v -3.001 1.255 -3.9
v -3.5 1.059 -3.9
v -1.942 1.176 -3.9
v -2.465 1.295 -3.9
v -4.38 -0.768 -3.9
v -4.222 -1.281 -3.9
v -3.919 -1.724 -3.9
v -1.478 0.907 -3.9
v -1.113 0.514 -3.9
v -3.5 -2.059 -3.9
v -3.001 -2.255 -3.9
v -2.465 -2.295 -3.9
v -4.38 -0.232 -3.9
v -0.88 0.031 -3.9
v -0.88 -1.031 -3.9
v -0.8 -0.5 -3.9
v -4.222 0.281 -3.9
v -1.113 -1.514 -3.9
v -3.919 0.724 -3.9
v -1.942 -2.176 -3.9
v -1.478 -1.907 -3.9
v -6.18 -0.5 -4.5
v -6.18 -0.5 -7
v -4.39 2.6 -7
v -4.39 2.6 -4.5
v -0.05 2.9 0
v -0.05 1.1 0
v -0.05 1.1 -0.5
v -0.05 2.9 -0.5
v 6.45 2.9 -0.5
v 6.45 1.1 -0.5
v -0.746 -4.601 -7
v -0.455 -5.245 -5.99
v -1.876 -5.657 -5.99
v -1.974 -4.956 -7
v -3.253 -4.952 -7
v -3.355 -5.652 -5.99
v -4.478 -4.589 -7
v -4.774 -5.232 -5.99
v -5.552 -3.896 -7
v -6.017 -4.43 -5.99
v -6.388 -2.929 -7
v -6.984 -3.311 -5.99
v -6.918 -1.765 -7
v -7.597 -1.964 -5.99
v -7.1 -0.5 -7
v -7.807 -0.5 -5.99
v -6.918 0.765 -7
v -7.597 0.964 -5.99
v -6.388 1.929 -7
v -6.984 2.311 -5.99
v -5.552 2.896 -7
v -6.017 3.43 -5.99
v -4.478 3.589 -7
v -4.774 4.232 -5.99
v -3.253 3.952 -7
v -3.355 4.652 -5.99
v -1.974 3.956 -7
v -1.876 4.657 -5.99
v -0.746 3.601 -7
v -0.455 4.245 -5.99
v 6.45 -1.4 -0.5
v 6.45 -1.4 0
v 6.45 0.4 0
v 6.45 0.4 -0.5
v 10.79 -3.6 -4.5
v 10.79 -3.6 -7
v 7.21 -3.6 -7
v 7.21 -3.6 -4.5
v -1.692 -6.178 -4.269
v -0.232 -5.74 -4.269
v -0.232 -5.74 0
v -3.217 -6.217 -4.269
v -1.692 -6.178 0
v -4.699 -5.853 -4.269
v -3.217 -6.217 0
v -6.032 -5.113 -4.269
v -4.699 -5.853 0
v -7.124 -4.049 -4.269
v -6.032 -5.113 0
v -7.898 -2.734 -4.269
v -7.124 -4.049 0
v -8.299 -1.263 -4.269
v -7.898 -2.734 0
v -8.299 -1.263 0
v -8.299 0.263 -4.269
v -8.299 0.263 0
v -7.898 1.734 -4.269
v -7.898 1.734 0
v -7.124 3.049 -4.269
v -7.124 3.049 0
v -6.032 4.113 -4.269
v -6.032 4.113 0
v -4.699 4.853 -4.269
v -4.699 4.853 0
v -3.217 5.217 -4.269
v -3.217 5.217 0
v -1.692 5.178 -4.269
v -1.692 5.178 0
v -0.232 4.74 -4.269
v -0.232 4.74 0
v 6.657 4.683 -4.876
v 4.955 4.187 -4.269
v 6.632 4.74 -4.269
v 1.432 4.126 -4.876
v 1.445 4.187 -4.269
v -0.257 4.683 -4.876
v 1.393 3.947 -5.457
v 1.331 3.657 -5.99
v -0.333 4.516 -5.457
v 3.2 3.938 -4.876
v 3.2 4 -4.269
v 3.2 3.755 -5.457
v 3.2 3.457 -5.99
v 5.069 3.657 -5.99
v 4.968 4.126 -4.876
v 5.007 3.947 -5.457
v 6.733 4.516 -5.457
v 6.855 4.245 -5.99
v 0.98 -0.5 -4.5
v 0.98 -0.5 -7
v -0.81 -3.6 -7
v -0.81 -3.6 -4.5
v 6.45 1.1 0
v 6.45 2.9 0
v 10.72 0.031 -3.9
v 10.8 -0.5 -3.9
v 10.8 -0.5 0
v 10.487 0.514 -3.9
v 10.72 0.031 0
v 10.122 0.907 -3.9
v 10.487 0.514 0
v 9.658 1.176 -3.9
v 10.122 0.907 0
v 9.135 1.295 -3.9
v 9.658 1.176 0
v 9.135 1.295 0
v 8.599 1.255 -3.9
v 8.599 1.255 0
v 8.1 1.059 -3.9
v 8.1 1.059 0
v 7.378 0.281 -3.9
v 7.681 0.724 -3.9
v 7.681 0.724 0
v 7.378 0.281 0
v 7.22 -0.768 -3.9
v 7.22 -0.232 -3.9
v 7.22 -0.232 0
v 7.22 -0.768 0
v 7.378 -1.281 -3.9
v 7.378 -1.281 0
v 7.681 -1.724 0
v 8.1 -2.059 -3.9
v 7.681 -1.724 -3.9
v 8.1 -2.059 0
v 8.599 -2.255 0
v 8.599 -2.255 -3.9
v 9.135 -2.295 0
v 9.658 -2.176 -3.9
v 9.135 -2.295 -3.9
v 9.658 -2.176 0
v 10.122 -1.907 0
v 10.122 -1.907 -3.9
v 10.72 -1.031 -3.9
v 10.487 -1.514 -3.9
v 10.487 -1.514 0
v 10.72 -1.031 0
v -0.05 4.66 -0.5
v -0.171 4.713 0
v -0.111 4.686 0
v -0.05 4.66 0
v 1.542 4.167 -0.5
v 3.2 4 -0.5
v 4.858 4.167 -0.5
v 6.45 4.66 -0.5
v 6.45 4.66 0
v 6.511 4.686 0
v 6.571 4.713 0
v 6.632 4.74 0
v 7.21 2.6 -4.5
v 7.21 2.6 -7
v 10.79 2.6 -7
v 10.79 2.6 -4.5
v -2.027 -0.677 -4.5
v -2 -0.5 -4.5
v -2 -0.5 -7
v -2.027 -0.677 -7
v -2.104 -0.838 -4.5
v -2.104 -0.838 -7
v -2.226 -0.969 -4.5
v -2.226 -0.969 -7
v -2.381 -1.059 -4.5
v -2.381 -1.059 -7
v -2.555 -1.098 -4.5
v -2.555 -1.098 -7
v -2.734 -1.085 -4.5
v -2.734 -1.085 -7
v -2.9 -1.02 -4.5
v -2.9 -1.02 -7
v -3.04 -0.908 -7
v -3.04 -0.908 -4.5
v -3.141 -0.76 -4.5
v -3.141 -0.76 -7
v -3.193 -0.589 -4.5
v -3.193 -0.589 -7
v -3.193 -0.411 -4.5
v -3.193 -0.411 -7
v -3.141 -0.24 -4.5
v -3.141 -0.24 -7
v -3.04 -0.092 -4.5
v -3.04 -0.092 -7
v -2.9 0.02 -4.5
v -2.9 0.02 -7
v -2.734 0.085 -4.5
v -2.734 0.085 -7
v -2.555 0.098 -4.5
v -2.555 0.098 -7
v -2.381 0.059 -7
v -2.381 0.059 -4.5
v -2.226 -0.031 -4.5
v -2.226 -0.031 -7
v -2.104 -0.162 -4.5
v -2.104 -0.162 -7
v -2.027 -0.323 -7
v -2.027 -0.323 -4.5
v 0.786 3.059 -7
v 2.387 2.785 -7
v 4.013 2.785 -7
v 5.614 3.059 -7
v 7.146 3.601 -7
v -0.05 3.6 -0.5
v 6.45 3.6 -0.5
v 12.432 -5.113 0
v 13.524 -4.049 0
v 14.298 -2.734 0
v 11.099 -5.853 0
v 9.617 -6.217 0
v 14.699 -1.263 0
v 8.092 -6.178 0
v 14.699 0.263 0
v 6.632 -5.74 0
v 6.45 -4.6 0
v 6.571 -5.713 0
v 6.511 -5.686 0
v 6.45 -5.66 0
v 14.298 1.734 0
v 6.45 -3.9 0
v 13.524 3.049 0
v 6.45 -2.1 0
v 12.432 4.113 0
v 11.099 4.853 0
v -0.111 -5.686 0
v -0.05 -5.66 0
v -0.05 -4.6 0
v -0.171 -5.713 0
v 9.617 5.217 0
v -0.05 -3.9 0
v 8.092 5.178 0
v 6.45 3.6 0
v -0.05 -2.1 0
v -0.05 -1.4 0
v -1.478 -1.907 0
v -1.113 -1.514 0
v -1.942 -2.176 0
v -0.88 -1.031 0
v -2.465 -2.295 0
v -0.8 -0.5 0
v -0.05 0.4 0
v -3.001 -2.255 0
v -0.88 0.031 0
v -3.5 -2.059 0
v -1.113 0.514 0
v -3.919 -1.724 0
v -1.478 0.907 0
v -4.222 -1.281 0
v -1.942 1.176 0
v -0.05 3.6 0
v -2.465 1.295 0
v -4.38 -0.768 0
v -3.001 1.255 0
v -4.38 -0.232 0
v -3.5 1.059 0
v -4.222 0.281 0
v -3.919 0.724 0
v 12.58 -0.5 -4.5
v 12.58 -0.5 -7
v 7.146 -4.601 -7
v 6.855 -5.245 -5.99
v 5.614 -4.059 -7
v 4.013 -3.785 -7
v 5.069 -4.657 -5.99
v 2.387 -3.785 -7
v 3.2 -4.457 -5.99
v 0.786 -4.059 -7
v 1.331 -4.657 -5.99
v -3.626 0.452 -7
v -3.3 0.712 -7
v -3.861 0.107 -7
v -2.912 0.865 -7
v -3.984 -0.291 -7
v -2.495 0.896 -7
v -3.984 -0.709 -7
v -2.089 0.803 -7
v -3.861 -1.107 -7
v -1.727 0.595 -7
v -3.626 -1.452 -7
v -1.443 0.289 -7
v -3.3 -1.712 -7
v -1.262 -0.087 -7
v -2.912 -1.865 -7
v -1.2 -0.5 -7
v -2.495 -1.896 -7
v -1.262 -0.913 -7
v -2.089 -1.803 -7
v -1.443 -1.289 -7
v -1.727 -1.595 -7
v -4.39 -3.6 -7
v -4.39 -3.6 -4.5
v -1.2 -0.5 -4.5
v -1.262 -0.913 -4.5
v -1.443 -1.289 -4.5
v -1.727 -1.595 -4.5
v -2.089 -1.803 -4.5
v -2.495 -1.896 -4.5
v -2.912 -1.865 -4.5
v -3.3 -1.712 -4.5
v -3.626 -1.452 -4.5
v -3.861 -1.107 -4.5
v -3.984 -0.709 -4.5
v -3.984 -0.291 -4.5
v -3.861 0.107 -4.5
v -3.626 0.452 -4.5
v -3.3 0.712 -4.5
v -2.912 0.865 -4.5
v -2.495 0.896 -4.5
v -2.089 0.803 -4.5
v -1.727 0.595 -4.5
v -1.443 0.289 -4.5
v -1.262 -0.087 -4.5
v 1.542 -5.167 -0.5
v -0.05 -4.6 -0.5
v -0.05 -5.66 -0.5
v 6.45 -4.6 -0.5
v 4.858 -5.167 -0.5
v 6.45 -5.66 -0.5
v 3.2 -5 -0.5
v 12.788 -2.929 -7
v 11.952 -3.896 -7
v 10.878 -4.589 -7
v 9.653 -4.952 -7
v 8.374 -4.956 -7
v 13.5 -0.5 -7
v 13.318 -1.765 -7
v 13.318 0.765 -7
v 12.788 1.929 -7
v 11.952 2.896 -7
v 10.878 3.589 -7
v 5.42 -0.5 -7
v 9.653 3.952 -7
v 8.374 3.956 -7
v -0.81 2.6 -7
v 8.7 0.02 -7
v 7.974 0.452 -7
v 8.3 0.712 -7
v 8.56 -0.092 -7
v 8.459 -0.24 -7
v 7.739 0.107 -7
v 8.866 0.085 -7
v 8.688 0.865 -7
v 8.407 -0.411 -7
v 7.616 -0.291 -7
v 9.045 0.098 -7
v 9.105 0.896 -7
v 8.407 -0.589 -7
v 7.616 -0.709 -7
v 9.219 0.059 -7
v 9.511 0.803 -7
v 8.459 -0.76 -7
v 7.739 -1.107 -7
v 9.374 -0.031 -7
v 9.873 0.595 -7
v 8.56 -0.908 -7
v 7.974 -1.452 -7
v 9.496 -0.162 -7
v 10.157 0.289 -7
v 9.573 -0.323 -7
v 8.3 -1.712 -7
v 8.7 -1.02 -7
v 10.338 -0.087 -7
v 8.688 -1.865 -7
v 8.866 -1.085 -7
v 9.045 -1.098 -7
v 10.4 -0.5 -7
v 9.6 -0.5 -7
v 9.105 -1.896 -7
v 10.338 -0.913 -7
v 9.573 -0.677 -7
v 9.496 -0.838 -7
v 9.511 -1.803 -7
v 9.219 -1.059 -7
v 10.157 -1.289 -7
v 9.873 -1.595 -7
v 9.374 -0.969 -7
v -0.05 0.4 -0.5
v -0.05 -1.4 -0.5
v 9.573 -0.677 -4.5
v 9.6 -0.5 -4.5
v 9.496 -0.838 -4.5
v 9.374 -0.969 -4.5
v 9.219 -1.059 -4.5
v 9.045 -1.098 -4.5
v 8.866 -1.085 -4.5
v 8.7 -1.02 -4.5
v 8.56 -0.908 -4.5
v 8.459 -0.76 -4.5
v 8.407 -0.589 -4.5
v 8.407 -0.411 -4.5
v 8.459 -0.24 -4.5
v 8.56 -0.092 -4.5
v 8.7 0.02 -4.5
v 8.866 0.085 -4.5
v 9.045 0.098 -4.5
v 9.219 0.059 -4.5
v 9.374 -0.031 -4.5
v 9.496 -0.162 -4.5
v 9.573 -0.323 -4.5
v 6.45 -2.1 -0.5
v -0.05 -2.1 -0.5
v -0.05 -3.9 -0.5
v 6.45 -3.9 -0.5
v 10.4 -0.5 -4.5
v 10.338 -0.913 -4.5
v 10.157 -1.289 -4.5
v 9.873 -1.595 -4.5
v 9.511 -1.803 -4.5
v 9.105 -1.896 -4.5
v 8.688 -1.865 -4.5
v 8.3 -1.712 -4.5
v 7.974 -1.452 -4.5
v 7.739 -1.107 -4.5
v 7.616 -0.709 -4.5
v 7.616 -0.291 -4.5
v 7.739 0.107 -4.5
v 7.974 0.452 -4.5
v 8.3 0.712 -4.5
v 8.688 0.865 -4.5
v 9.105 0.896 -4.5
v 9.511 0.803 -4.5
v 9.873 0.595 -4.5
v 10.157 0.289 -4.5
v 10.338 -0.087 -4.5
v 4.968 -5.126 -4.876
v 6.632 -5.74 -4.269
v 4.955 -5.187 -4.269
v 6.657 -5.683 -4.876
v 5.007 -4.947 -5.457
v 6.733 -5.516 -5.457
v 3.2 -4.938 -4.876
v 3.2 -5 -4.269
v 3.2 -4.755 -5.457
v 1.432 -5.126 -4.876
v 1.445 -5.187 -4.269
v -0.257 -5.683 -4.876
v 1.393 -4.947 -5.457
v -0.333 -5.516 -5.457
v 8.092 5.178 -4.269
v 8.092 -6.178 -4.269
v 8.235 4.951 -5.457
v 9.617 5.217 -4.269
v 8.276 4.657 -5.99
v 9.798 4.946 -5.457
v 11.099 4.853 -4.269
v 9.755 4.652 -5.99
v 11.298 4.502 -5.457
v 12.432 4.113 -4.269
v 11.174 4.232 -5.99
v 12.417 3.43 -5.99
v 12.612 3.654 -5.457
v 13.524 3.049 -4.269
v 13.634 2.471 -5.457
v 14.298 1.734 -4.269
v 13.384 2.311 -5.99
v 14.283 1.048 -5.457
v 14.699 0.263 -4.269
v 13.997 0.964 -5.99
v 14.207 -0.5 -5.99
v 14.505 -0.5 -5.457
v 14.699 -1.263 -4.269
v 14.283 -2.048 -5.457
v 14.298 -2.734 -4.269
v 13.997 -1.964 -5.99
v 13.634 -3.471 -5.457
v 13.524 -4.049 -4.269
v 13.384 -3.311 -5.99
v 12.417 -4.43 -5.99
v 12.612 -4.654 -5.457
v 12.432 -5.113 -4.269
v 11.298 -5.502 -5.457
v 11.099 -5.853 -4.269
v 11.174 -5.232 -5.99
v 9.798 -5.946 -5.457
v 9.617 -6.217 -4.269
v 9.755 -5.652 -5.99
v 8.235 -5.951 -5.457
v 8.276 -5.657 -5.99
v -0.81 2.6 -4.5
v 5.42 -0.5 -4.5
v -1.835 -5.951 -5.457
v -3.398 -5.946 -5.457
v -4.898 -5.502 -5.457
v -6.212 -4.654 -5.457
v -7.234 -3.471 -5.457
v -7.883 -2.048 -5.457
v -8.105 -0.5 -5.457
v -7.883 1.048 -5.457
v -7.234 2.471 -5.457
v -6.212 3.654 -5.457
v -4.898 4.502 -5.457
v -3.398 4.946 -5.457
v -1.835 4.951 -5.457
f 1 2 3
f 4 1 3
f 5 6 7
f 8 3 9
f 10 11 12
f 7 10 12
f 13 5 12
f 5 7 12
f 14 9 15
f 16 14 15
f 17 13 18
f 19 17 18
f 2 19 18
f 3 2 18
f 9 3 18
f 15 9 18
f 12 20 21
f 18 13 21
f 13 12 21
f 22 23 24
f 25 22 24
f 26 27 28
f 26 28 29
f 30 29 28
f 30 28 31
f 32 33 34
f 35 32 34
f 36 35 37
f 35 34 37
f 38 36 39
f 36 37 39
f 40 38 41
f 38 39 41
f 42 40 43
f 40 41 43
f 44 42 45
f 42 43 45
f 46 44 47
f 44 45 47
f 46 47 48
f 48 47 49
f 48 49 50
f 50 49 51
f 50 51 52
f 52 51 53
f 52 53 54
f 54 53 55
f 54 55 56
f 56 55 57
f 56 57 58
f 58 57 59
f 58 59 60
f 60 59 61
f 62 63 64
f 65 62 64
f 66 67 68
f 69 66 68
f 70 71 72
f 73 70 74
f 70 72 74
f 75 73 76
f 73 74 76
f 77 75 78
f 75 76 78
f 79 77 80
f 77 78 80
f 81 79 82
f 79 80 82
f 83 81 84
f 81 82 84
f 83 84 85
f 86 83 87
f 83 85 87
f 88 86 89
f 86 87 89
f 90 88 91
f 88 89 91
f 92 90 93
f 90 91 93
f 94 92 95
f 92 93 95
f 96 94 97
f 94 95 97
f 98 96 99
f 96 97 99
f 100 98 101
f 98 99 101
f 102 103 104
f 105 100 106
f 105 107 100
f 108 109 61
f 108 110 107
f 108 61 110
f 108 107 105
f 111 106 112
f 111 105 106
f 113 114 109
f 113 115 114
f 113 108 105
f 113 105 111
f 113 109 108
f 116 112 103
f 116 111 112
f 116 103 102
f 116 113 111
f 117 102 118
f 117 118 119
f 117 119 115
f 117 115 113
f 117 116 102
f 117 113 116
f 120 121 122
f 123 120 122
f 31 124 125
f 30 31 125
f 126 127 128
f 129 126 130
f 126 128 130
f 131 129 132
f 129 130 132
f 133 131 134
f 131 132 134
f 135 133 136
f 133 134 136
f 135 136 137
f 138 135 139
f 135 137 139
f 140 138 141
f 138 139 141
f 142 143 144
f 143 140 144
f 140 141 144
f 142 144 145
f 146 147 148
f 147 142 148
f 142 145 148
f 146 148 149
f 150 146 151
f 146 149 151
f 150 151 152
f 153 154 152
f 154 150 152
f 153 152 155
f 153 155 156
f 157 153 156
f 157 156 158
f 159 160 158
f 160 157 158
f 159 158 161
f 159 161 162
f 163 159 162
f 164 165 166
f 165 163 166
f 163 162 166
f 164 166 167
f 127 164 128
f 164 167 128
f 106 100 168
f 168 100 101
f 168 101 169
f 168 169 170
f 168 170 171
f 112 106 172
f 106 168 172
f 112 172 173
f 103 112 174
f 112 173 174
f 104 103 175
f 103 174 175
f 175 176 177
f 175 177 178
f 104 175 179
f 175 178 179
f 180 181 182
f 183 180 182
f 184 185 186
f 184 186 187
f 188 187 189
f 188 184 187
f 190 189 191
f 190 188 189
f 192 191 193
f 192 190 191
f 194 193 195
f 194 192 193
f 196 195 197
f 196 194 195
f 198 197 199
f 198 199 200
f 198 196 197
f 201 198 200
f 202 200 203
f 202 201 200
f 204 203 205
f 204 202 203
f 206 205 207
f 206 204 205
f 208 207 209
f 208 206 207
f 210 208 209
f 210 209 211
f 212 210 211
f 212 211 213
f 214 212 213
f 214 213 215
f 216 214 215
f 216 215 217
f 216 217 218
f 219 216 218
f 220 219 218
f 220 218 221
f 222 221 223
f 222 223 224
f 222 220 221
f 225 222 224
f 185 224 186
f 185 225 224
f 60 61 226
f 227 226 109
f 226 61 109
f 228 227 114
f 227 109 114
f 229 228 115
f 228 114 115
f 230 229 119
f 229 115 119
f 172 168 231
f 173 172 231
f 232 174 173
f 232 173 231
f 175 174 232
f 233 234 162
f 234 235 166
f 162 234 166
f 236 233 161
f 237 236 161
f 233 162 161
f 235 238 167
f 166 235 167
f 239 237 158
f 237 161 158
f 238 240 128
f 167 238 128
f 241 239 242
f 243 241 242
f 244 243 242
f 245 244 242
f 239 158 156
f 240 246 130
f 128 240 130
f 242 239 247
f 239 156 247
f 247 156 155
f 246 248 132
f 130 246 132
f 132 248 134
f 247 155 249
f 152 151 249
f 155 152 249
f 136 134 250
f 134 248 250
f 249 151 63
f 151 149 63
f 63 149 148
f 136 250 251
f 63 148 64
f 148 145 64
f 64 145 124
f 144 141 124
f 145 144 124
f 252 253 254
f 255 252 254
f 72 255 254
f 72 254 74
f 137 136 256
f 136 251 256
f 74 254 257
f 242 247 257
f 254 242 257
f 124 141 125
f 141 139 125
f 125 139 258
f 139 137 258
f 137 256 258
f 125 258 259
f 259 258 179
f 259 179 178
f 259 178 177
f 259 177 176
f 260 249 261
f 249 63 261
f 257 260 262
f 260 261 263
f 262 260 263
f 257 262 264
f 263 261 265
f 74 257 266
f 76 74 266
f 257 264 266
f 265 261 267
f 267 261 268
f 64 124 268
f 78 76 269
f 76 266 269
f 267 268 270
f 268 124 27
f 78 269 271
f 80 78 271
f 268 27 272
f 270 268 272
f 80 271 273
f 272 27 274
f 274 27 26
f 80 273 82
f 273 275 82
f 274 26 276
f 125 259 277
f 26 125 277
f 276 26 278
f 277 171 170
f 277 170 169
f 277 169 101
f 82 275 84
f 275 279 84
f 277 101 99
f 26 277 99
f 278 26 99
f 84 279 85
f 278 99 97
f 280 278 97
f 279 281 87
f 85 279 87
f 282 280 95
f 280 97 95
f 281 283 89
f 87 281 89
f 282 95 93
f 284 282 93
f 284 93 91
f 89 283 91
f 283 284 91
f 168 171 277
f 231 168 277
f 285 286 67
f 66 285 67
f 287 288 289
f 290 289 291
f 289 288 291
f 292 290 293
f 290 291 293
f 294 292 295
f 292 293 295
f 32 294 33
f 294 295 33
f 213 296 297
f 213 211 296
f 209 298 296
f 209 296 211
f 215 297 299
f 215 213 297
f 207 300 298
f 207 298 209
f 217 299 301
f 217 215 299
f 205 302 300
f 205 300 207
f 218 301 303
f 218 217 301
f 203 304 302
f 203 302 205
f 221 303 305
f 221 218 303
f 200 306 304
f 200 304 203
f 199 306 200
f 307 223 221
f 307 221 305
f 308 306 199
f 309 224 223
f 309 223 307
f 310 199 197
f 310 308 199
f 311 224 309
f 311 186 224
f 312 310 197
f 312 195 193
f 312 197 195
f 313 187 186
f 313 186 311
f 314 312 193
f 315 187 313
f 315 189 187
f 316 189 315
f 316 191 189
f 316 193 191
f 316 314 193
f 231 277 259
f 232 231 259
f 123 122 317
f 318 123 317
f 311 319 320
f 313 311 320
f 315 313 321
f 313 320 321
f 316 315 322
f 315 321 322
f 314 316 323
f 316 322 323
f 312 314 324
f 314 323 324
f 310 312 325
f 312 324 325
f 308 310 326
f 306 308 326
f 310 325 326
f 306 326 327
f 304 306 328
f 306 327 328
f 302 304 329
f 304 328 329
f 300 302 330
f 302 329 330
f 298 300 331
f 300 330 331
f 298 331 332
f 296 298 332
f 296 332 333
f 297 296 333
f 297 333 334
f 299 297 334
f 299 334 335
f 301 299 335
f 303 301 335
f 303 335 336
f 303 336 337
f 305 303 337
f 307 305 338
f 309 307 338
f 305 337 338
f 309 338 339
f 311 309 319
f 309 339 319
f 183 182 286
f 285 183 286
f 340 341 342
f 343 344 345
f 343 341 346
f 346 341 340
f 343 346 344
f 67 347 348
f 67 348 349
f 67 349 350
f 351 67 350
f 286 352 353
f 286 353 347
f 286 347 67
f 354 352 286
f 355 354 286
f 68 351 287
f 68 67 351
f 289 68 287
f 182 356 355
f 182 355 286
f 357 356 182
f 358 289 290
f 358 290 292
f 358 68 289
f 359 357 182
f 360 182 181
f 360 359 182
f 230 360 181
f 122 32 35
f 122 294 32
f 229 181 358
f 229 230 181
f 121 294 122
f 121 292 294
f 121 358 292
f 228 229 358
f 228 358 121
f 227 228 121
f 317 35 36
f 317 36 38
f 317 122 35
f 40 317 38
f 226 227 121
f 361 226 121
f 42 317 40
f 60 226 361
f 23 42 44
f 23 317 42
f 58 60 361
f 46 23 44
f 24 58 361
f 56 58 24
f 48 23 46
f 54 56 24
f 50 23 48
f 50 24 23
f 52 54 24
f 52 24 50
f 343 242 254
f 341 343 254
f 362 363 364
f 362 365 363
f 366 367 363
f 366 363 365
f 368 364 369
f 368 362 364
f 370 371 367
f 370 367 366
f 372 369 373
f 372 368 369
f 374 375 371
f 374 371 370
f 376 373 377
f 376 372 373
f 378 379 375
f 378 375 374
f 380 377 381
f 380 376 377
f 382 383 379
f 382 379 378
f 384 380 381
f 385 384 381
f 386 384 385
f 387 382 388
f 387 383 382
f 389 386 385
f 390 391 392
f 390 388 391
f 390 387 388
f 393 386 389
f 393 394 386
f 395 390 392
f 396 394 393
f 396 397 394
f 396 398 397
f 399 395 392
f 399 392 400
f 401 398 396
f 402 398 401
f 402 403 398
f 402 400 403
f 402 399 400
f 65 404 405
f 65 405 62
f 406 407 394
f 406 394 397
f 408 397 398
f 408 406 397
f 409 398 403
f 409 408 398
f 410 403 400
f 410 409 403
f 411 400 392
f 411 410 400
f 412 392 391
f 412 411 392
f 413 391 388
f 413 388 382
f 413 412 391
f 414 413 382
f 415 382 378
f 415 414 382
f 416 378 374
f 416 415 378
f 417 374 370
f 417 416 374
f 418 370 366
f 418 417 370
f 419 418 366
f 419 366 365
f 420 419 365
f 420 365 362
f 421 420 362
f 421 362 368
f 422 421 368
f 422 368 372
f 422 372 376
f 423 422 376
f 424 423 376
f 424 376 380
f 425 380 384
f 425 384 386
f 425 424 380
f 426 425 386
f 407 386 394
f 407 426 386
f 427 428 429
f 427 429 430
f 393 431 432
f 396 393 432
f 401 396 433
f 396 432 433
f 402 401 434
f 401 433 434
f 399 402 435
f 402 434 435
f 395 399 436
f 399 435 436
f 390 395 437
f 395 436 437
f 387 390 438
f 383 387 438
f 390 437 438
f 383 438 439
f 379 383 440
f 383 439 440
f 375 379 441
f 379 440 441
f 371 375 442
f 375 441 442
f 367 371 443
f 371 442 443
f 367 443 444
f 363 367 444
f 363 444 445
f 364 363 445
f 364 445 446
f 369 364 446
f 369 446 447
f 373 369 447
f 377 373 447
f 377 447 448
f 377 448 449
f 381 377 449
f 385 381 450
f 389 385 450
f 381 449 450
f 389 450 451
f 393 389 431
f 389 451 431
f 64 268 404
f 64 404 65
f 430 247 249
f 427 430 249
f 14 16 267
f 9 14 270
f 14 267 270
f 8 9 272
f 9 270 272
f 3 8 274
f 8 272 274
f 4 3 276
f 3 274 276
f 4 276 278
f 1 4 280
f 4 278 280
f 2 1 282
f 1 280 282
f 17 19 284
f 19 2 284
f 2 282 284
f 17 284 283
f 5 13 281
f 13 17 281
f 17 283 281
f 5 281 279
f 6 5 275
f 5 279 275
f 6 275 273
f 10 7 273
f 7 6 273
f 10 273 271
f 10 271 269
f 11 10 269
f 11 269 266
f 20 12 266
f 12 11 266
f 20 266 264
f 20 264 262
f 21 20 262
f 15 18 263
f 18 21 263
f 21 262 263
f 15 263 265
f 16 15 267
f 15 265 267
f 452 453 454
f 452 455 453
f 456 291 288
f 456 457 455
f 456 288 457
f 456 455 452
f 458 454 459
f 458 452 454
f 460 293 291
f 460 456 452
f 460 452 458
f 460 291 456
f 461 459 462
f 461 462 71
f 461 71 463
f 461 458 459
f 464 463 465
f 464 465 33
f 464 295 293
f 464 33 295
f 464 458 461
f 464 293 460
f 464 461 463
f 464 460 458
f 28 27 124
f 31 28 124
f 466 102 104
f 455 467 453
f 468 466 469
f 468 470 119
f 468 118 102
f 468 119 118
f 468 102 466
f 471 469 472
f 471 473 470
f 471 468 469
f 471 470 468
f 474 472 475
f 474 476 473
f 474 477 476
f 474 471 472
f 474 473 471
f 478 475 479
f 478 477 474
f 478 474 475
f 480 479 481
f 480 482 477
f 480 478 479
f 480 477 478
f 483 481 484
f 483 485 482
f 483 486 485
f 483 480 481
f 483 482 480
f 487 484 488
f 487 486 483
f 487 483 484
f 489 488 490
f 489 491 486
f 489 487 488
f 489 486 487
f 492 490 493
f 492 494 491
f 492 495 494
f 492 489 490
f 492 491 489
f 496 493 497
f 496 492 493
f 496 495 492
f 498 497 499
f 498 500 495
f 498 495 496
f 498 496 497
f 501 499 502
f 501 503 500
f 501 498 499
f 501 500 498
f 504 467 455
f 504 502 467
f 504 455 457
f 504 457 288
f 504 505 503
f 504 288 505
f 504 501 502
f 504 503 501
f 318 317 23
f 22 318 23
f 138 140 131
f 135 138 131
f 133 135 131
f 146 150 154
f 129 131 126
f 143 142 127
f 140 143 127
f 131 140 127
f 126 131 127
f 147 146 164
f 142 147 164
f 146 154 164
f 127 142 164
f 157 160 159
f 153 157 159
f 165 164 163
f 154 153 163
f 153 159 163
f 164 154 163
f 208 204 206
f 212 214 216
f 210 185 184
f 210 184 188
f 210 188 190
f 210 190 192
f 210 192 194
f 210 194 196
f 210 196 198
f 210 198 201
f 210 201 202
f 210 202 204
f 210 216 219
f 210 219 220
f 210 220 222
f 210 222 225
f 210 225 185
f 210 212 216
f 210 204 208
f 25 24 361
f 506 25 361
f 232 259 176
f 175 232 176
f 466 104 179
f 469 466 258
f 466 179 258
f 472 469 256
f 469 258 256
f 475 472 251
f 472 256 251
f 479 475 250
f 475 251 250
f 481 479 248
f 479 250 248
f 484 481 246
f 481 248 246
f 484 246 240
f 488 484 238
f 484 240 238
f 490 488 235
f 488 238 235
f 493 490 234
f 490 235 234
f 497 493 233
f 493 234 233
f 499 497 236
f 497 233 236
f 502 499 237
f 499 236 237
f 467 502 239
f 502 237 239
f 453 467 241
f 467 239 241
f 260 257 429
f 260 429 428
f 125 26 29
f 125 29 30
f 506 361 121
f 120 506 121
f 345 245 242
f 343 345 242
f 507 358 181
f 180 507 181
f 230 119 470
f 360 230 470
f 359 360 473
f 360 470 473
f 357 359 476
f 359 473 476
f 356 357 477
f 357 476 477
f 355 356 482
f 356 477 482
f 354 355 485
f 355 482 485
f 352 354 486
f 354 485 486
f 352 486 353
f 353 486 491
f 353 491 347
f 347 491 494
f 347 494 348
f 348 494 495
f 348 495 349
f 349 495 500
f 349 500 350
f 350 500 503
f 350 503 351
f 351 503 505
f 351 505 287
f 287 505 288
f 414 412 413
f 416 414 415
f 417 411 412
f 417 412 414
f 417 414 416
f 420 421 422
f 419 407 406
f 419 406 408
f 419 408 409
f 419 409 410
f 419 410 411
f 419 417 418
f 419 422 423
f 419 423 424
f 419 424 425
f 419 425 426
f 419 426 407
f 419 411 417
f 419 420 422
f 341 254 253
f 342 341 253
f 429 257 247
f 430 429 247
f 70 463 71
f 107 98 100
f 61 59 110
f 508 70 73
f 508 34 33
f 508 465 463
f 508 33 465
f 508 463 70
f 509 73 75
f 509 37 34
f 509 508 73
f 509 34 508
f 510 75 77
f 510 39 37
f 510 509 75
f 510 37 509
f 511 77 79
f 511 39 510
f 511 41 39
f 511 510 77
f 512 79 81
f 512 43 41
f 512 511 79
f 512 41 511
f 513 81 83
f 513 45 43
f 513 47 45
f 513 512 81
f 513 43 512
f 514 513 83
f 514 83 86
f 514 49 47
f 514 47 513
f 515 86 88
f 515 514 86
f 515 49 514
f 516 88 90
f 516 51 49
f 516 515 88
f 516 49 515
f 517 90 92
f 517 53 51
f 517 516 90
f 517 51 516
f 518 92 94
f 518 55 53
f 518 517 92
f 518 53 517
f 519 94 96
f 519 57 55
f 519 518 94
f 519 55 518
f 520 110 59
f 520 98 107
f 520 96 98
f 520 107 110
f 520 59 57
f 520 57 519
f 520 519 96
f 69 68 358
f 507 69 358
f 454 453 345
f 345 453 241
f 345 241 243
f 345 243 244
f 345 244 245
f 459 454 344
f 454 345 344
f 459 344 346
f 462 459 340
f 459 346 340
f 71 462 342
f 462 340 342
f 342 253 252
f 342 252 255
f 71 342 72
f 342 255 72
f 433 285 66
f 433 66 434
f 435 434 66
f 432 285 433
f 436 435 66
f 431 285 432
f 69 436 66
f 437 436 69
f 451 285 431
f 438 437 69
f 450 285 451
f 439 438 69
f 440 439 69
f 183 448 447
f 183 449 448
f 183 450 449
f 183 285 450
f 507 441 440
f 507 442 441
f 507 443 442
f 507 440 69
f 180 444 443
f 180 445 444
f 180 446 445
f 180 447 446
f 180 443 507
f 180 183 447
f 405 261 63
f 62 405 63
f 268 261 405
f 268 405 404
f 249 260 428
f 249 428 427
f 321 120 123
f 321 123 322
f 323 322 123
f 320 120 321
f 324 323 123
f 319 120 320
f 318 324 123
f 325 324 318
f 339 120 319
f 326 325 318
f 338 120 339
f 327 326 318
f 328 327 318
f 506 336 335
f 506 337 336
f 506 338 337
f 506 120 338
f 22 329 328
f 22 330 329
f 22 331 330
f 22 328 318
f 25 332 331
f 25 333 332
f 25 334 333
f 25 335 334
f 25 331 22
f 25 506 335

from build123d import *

# Parameters (mm, degrees)
BOSS_EXTRUDE1_DEPTH = 7
SKETCH5_R           = 1.799999865
SKETCH5_R_2         = 1.8
CUT_EXTRUDE4_DEPTH  = 18.482133737
SKETCH2_W           = 6.5
SKETCH2_H           = 1.8
CUT_EXTRUDE1_DEPTH  = 0.5
CUT_EXTRUDE5_DEPTH  = 2.5
CHAMFER1_SIZE       = 1.25
CHAMFER1_SIZE2      = 1.785185008
FILLET1_R           = 3
BOSS_EXTRUDE2_START = -0.6
SKETCH7_R           = 1.799999865
SKETCH7_R_2         = 1.8
BOSS_EXTRUDE2_DEPTH = 0.6
SKETCH8_R           = 1.399999865
SKETCH8_R_2         = 0.599999865
SKETCH8_R_3         = 1.4
SKETCH8_R_4         = 0.6
BOSS_EXTRUDE3_DEPTH = 2.5


with BuildPart() as part:
    # Sketch1 → Boss-Extrude1 (new body)
    with BuildSketch(Plane.XY):
        with BuildLine():
            ThreePointArc((6.631560259, -5.739560401), (3.2, -5), (-0.231560259, -5.739560401))
            ThreePointArc((-0.231560259, -5.739560401), (-8.35, -0.5), (-0.231560259, 4.739560401))
            ThreePointArc((-0.231560259, 4.739560401), (3.2, 4), (6.631560259, 4.739560401))
            ThreePointArc((6.631560259, 4.739560401), (14.75, -0.5), (6.631560259, -5.739560401))
        make_face()
    extrude(amount=-BOSS_EXTRUDE1_DEPTH)

    # Sketch5 → Cut-Extrude4 (cut, through all)
    with BuildSketch(Plane.XY):
        with Locations((9, -0.5)):
            Circle(SKETCH5_R)
        with Locations((-2.6, -0.5)):
            Circle(SKETCH5_R_2)
    extrude(amount=-CUT_EXTRUDE4_DEPTH, mode=Mode.SUBTRACT)

    # Sketch2 → Cut-Extrude1 (cut)
    with BuildSketch(Plane.XY):
        with Locations((3.200000135, 2)):
            Rectangle(SKETCH2_W, SKETCH2_H)
        with Locations((3.200000135, -0.5)):
            Rectangle(SKETCH2_W, SKETCH2_H)
        with BuildLine():
            Line((6.450000135, -4.6), (-0.049999865, -4.6))
            Line((-0.049999865, -4.6), (-0.049999865, -5.660076856))
            ThreePointArc((-0.049999865, -5.660076856), (3.200000146, -5), (6.450000135, -5.660076971))
            Line((6.450000135, -5.660076971), (6.450000135, -4.6))
        make_face()
        with Locations((3.200000135, -3)):
            Rectangle(SKETCH2_W, SKETCH2_H)
        with BuildLine():
            Line((6.450000135, 3.6), (6.450000135, 4.660076971))
            ThreePointArc((6.450000135, 4.660076971), (3.200000146, 4), (-0.049999865, 4.660076856))
            Line((-0.049999865, 4.660076856), (-0.049999865, 3.6))
            Line((-0.049999865, 3.6), (6.450000135, 3.6))
        make_face()
    extrude(amount=-CUT_EXTRUDE1_DEPTH, mode=Mode.SUBTRACT)

    # Sketch6 → Cut-Extrude5 (cut)
    with BuildSketch(Plane(origin=(0, 0, -7), x_dir=(-1, 0, 0), z_dir=(0, 0, -1))):
        Polygon((-0.979571669, -0.5), (0.810214166, -3.6), (4.389785834, -3.6), (6.179571669, -0.5), (4.389785834, 2.6), (0.810214166, 2.6), align=None)
        Polygon((-5.420428331, -0.5), (-7.210214166, 2.6), (-10.789785834, 2.6), (-12.579571669, -0.5), (-10.789785834, -3.6), (-7.210214166, -3.6), align=None)
    extrude(amount=-CUT_EXTRUDE5_DEPTH, mode=Mode.SUBTRACT)

    # Chamfer1
    chamfer1_edges = [part.edges().sort_by_distance(p)[0] for p in [
        (-8.35, -0.5, -7),
        (3.2, -5, -7),
        (14.75, -0.5, -7),
        (3.2, 4, -7),
    ]]
    chamfer1_side = [part.faces().sort_by_distance(p)[0] for p in [
        (3.2, -0.5, -7),
    ]]
    chamfer(chamfer1_edges, length=CHAMFER1_SIZE, length2=CHAMFER1_SIZE2, reference=chamfer1_side[0])

    # Fillet1
    # the kernel refuses this fillet: 3 mm, written as the material it takes off along each edge
    with BuildSketch(Plane(origin=(9, -0.5, -5.214814992), x_dir=(-0.41190256373837064, 0.9112278957460408, 0), z_dir=(-0.9112278957460408, -0.41190256373837064, 0))) as fillet1_piece_1:
        with BuildLine():
            CenterArc((5.75 - FILLET1_R, -FILLET1_R * 0.315298788879), FILLET1_R, 0, 35)
            Line((5.75 - FILLET1_R * 0.180847955711, FILLET1_R * 0.258277647472), (5.75, 0))
            Line((5.75, 0), (5.75, -FILLET1_R * 0.315298788879))
        make_face()
    fillet1_piece_1_solid = revolve(axis=Axis((9, -0.5, -5.214814992), (0, 0, -1)), revolution_arc=228.648814079, mode=Mode.PRIVATE)
    with BuildSketch(Plane(origin=(3.2, 12.331, -5.214814992), x_dir=(-0.41190256373837086, -0.9112278957460408, 0), z_dir=(-0.9112278957460408, 0.41190256373837086, 0))) as fillet1_piece_2:
        with BuildLine():
            CenterArc((8.331 + FILLET1_R, FILLET1_R * 0.315298788879), FILLET1_R, 180, 35)
            Line((8.331 + FILLET1_R * 0.180847955711, -FILLET1_R * 0.258277647472), (8.331, 0))
            Line((8.331, 0), (8.331, FILLET1_R * 0.315298788879))
        make_face()
    fillet1_piece_2_solid = revolve(axis=Axis((3.2, 12.331, -5.214814992), (0, 0, 1)), revolution_arc=48.648814079, mode=Mode.PRIVATE)
    with BuildSketch(Plane(origin=(3.2, -13.331, -5.214814992), x_dir=(0.41190256373837153, 0.9112278957460405, 0), z_dir=(0.9112278957460405, -0.41190256373837153, 0))) as fillet1_piece_3:
        with BuildLine():
            CenterArc((8.331 + FILLET1_R, FILLET1_R * 0.315298788879), FILLET1_R, 180, 35)
            Line((8.331 + FILLET1_R * 0.180847955711, -FILLET1_R * 0.258277647472), (8.331, 0))
            Line((8.331, 0), (8.331, FILLET1_R * 0.315298788879))
        make_face()
    fillet1_piece_3_solid = revolve(axis=Axis((3.2, -13.331, -5.214814992), (0, 0, 1)), revolution_arc=48.648814079, mode=Mode.PRIVATE)
    with BuildSketch(Plane(origin=(-2.6, -0.5, -5.214814992), x_dir=(0.41190256373837075, -0.9112278957460408, 0), z_dir=(0.9112278957460408, 0.41190256373837075, 0))) as fillet1_piece_4:
        with BuildLine():
            CenterArc((5.75 - FILLET1_R, -FILLET1_R * 0.315298788879), FILLET1_R, 0, 35)
            Line((5.75 - FILLET1_R * 0.180847955711, FILLET1_R * 0.258277647472), (5.75, 0))
            Line((5.75, 0), (5.75, -FILLET1_R * 0.315298788879))
        make_face()
    fillet1_piece_4_solid = revolve(axis=Axis((-2.6, -0.5, -5.214814992), (0, 0, -1)), revolution_arc=228.648814079, mode=Mode.PRIVATE)
    add([fillet1_piece_1_solid, fillet1_piece_2_solid, fillet1_piece_3_solid, fillet1_piece_4_solid], mode=Mode.SUBTRACT)

    # Sketch7 → Boss-Extrude2 (add)
    with BuildSketch(Plane(origin=(0, 0, -4.5), x_dir=(-1, 0, 0), z_dir=(0, 0, -1)).offset(BOSS_EXTRUDE2_START)):
        with Locations(Location((-9, -0.5, 0), (0, 0, 180))):
            Circle(SKETCH7_R)
        with Locations(Location((2.6, -0.5, 0), (0, 0, 180))):
            Circle(SKETCH7_R_2)
    extrude(amount=BOSS_EXTRUDE2_DEPTH)

    # Sketch8 → Boss-Extrude3 (add)
    # profile 1 of 2: a face of its own
    with BuildSketch(Plane(origin=(0, 0, -4.5), x_dir=(-1, 0, 0), z_dir=(0, 0, -1))):
        with Locations(Location((-9, -0.5, 0), (0, 0, 180))):
            Circle(SKETCH8_R)
        with Locations(Location((-9, -0.5, 0), (0, 0, 180))):
            Circle(SKETCH8_R_2, mode=Mode.SUBTRACT)
    # profile 2 of 2: a face of its own
    with BuildSketch(Plane(origin=(0, 0, -4.5), x_dir=(-1, 0, 0), z_dir=(0, 0, -1))):
        with Locations(Location((2.6, -0.5, 0), (0, 0, 180))):
            Circle(SKETCH8_R_3)
        with Locations(Location((2.6, -0.5, 0), (0, 0, 180))):
            Circle(SKETCH8_R_4, mode=Mode.SUBTRACT)
    extrude(amount=BOSS_EXTRUDE3_DEPTH)


solid = part.part
